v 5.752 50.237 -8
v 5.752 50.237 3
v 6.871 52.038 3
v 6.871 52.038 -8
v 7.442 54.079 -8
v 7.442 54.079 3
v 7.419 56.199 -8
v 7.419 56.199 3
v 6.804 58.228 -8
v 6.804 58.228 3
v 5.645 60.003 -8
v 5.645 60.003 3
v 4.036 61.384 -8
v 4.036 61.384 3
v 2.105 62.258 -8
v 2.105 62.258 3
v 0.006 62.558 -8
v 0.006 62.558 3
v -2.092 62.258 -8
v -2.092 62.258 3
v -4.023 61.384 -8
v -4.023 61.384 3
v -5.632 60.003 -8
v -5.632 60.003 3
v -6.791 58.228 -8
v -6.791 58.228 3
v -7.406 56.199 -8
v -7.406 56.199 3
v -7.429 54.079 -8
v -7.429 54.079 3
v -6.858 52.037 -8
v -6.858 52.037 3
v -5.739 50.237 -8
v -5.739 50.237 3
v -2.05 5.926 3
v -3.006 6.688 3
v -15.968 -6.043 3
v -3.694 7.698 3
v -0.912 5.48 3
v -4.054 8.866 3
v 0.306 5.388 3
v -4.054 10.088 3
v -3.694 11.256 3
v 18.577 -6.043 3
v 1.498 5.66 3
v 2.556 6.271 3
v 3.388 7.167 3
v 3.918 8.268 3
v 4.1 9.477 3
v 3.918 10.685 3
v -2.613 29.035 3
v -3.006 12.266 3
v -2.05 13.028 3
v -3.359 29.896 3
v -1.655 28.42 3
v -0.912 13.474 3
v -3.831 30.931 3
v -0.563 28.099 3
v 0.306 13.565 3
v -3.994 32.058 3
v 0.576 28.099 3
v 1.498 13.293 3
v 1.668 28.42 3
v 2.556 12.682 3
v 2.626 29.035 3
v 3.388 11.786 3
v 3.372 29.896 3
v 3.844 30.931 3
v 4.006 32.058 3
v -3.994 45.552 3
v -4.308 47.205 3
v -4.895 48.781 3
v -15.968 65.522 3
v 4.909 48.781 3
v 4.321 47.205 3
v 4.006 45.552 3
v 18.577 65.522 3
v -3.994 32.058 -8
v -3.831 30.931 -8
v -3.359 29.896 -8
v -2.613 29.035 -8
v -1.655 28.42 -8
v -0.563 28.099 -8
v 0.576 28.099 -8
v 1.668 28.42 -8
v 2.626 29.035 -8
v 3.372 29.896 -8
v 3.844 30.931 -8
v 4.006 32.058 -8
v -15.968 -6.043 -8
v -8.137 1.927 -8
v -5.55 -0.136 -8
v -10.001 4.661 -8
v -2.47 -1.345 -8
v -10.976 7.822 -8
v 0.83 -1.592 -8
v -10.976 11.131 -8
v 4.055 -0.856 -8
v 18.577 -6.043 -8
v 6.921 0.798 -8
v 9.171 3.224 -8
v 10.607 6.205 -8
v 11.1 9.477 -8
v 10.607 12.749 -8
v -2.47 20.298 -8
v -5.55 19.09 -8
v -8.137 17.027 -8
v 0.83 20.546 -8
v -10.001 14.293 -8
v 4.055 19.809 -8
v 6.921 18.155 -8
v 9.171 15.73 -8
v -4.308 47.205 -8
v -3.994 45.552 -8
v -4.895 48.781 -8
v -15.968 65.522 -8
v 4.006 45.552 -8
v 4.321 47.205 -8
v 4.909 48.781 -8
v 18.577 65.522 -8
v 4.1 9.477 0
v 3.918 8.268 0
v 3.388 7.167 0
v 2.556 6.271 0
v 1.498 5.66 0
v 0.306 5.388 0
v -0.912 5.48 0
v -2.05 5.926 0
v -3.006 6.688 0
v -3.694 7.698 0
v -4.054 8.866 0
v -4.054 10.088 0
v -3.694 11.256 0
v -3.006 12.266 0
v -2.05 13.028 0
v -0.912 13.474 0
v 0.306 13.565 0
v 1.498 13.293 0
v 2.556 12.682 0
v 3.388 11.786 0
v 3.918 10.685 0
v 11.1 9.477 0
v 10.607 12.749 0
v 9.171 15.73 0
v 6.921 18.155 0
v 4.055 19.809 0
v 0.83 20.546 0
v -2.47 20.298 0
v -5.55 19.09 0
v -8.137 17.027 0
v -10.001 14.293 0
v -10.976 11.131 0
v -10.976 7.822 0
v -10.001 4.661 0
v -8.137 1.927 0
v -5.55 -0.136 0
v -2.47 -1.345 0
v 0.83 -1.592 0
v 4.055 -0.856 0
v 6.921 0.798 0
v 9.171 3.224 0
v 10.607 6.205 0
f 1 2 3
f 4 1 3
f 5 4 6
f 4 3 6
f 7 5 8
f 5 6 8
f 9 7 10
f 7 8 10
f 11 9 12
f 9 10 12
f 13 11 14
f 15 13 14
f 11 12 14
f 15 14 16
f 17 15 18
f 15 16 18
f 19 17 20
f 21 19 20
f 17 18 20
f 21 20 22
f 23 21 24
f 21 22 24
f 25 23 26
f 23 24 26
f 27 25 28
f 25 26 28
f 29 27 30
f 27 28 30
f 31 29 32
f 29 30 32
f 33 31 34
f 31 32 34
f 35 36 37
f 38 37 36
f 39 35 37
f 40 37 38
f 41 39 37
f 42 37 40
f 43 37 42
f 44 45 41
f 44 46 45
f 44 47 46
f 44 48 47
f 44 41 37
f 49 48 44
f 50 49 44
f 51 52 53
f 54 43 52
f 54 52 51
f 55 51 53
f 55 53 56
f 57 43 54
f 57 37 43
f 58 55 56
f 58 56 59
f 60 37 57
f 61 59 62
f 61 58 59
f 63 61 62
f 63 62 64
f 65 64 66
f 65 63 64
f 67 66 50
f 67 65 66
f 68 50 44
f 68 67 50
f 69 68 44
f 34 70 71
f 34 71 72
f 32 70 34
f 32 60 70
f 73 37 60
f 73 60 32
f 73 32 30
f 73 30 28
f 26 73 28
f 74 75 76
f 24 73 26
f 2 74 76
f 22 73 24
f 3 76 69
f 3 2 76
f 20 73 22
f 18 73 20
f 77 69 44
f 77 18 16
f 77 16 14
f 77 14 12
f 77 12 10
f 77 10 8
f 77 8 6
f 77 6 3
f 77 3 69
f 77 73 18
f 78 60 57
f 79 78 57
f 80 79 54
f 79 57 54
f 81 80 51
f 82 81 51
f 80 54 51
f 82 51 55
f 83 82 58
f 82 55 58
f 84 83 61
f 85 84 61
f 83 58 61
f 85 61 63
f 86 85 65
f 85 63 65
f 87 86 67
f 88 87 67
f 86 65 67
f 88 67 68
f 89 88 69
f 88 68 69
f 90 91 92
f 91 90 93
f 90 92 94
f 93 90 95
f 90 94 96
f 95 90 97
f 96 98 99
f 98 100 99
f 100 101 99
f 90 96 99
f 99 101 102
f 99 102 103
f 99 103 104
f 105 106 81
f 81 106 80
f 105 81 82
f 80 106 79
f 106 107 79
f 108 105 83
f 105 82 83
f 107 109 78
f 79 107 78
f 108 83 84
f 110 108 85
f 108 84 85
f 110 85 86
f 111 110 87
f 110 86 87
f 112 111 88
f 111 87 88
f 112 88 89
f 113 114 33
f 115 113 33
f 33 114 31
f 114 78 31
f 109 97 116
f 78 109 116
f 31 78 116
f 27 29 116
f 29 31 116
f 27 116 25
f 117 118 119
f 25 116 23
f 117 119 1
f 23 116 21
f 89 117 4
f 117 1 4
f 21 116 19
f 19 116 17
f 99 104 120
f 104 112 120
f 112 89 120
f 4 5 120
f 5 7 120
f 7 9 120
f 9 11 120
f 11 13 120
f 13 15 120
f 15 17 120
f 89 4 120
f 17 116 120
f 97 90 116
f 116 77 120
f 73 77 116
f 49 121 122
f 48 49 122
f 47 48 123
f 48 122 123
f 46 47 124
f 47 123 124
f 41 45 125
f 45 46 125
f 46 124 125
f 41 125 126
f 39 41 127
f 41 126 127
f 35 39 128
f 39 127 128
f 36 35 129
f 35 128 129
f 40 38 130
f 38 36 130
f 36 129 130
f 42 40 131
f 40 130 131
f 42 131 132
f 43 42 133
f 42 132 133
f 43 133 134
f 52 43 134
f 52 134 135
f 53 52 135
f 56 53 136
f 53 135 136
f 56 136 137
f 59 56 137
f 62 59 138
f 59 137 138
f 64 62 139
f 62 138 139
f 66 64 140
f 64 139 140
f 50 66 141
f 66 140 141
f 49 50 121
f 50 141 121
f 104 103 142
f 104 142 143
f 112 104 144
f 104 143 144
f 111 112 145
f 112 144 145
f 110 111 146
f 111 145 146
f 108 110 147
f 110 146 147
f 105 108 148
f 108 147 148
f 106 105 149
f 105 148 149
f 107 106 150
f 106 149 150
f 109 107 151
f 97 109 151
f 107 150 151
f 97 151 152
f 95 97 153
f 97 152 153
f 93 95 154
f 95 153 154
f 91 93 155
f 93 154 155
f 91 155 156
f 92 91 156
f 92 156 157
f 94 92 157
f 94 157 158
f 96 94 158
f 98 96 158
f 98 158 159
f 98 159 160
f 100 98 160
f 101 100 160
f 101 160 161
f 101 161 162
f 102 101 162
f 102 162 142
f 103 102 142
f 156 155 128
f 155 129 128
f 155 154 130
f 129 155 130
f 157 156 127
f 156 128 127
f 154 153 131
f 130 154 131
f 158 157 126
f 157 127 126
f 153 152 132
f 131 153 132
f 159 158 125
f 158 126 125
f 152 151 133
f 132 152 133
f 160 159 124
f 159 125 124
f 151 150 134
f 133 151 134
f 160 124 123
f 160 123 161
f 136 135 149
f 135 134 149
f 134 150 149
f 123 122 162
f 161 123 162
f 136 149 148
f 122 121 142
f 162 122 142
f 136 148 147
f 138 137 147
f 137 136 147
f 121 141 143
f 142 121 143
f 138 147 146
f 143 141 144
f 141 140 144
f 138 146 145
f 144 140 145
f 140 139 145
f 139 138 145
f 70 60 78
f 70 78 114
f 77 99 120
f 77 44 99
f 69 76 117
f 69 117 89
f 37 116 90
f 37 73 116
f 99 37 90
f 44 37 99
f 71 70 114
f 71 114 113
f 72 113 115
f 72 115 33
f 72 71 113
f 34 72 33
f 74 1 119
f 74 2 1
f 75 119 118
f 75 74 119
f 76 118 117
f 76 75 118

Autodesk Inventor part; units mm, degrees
ref_plane "YZ Plane" through (0, 0, 0) normal (1, 0, 0) x (0, 1, 0)
ref_plane "XZ Plane" through (0, 0, 0) normal (0, 1, 0) x (-1, 0, 0)
ref_plane "XY Plane" through (0, 0, 0) normal (0, 0, 1) x (1, 0, 0)
sketch "Sketch1" plane through (0, 0, 0) normal (0, 0, 1) x (1, 0, 0)
  circle A0 centre (0, 9.4768) radius 4.1
  circle A1 centre (0, 9.4768) radius 11.1
  arc A2 (5.7519, 50.2372) -> (4.0065, 45.5517) centre (13.9526, 44.5146) ccw
  arc A3 (-3.9935, 45.5517) -> (-5.7388, 50.2372) centre (-13.9395, 44.5146) ccw
  line L0 (4.0065, 55.0581) -> (4.0065, 33.0581)
  line L1 (-3.9935, 33.0581) -> (-3.9935, 55.0581)
  line L2 (-3.9935, 55.0581) -> (4.0065, 55.0581)
  line L3 (0.0065, 55.0581) -> (5.7519, 50.2372)
  line L4 (0.0065, 55.0581) -> (0.0065, 47.5581) construction
  line L5 (0.0065, 55.0581) -> (-5.7388, 50.2372)
  circle A4 centre (0.0065, 55.0581) radius 7.5
  line L6 (4.0065, 33.0581) -> (-3.9935, 33.0581)
  line L7 (0.0065, 55.0581) -> (0.0065, 32.0581) construction
  line L8 (4.0065, 55.0581) -> (4.0065, 32.0581)
  line L9 (-3.9935, 32.0581) -> (-3.9935, 55.0581)
  arc A5 (4.0065, 55.0581) -> (-3.9935, 55.0581) centre (0.0065, 55.0581) ccw
  arc A6 (-3.9935, 32.0581) -> (4.0065, 32.0581) centre (0.0065, 32.0581) ccw
  line L10 (-15.9677, -6.0429) -> (18.5773, -6.0429)
  line L11 (18.5773, -6.0429) -> (18.5773, 65.522)
  line L12 (18.5773, 65.522) -> (-15.9677, 65.522)
  line L13 (-15.9677, 65.522) -> (-15.9677, -6.0429)
  point P0 (0, 0)
  point P1 (0.0065, 55.0581)
  point P2 (0.0065, 55.0581)
  point P3 (0.0065, 43.5581)
  point P4 (-3.9935, 45.5517)
  dimension "d2" = 15
  dimension "d0" = 8.2
  dimension "d1" = 22.2
  dimension "d3" = 22
  dimension "d4" = 8
  dimension "d5" = 50
  dimension "d6" = 5
  dimension "d7" = 10
  dimension "d8" = 23
extrude "Extrusion1" add sketch "Sketch1" along normal blind 3 contours A1 | L13 L12 L11 L10
extrude "Extrusion2" add sketch "Sketch1" against normal blind 8 contours L13 L12 L11 L10
properties part number "Prueba3D"
